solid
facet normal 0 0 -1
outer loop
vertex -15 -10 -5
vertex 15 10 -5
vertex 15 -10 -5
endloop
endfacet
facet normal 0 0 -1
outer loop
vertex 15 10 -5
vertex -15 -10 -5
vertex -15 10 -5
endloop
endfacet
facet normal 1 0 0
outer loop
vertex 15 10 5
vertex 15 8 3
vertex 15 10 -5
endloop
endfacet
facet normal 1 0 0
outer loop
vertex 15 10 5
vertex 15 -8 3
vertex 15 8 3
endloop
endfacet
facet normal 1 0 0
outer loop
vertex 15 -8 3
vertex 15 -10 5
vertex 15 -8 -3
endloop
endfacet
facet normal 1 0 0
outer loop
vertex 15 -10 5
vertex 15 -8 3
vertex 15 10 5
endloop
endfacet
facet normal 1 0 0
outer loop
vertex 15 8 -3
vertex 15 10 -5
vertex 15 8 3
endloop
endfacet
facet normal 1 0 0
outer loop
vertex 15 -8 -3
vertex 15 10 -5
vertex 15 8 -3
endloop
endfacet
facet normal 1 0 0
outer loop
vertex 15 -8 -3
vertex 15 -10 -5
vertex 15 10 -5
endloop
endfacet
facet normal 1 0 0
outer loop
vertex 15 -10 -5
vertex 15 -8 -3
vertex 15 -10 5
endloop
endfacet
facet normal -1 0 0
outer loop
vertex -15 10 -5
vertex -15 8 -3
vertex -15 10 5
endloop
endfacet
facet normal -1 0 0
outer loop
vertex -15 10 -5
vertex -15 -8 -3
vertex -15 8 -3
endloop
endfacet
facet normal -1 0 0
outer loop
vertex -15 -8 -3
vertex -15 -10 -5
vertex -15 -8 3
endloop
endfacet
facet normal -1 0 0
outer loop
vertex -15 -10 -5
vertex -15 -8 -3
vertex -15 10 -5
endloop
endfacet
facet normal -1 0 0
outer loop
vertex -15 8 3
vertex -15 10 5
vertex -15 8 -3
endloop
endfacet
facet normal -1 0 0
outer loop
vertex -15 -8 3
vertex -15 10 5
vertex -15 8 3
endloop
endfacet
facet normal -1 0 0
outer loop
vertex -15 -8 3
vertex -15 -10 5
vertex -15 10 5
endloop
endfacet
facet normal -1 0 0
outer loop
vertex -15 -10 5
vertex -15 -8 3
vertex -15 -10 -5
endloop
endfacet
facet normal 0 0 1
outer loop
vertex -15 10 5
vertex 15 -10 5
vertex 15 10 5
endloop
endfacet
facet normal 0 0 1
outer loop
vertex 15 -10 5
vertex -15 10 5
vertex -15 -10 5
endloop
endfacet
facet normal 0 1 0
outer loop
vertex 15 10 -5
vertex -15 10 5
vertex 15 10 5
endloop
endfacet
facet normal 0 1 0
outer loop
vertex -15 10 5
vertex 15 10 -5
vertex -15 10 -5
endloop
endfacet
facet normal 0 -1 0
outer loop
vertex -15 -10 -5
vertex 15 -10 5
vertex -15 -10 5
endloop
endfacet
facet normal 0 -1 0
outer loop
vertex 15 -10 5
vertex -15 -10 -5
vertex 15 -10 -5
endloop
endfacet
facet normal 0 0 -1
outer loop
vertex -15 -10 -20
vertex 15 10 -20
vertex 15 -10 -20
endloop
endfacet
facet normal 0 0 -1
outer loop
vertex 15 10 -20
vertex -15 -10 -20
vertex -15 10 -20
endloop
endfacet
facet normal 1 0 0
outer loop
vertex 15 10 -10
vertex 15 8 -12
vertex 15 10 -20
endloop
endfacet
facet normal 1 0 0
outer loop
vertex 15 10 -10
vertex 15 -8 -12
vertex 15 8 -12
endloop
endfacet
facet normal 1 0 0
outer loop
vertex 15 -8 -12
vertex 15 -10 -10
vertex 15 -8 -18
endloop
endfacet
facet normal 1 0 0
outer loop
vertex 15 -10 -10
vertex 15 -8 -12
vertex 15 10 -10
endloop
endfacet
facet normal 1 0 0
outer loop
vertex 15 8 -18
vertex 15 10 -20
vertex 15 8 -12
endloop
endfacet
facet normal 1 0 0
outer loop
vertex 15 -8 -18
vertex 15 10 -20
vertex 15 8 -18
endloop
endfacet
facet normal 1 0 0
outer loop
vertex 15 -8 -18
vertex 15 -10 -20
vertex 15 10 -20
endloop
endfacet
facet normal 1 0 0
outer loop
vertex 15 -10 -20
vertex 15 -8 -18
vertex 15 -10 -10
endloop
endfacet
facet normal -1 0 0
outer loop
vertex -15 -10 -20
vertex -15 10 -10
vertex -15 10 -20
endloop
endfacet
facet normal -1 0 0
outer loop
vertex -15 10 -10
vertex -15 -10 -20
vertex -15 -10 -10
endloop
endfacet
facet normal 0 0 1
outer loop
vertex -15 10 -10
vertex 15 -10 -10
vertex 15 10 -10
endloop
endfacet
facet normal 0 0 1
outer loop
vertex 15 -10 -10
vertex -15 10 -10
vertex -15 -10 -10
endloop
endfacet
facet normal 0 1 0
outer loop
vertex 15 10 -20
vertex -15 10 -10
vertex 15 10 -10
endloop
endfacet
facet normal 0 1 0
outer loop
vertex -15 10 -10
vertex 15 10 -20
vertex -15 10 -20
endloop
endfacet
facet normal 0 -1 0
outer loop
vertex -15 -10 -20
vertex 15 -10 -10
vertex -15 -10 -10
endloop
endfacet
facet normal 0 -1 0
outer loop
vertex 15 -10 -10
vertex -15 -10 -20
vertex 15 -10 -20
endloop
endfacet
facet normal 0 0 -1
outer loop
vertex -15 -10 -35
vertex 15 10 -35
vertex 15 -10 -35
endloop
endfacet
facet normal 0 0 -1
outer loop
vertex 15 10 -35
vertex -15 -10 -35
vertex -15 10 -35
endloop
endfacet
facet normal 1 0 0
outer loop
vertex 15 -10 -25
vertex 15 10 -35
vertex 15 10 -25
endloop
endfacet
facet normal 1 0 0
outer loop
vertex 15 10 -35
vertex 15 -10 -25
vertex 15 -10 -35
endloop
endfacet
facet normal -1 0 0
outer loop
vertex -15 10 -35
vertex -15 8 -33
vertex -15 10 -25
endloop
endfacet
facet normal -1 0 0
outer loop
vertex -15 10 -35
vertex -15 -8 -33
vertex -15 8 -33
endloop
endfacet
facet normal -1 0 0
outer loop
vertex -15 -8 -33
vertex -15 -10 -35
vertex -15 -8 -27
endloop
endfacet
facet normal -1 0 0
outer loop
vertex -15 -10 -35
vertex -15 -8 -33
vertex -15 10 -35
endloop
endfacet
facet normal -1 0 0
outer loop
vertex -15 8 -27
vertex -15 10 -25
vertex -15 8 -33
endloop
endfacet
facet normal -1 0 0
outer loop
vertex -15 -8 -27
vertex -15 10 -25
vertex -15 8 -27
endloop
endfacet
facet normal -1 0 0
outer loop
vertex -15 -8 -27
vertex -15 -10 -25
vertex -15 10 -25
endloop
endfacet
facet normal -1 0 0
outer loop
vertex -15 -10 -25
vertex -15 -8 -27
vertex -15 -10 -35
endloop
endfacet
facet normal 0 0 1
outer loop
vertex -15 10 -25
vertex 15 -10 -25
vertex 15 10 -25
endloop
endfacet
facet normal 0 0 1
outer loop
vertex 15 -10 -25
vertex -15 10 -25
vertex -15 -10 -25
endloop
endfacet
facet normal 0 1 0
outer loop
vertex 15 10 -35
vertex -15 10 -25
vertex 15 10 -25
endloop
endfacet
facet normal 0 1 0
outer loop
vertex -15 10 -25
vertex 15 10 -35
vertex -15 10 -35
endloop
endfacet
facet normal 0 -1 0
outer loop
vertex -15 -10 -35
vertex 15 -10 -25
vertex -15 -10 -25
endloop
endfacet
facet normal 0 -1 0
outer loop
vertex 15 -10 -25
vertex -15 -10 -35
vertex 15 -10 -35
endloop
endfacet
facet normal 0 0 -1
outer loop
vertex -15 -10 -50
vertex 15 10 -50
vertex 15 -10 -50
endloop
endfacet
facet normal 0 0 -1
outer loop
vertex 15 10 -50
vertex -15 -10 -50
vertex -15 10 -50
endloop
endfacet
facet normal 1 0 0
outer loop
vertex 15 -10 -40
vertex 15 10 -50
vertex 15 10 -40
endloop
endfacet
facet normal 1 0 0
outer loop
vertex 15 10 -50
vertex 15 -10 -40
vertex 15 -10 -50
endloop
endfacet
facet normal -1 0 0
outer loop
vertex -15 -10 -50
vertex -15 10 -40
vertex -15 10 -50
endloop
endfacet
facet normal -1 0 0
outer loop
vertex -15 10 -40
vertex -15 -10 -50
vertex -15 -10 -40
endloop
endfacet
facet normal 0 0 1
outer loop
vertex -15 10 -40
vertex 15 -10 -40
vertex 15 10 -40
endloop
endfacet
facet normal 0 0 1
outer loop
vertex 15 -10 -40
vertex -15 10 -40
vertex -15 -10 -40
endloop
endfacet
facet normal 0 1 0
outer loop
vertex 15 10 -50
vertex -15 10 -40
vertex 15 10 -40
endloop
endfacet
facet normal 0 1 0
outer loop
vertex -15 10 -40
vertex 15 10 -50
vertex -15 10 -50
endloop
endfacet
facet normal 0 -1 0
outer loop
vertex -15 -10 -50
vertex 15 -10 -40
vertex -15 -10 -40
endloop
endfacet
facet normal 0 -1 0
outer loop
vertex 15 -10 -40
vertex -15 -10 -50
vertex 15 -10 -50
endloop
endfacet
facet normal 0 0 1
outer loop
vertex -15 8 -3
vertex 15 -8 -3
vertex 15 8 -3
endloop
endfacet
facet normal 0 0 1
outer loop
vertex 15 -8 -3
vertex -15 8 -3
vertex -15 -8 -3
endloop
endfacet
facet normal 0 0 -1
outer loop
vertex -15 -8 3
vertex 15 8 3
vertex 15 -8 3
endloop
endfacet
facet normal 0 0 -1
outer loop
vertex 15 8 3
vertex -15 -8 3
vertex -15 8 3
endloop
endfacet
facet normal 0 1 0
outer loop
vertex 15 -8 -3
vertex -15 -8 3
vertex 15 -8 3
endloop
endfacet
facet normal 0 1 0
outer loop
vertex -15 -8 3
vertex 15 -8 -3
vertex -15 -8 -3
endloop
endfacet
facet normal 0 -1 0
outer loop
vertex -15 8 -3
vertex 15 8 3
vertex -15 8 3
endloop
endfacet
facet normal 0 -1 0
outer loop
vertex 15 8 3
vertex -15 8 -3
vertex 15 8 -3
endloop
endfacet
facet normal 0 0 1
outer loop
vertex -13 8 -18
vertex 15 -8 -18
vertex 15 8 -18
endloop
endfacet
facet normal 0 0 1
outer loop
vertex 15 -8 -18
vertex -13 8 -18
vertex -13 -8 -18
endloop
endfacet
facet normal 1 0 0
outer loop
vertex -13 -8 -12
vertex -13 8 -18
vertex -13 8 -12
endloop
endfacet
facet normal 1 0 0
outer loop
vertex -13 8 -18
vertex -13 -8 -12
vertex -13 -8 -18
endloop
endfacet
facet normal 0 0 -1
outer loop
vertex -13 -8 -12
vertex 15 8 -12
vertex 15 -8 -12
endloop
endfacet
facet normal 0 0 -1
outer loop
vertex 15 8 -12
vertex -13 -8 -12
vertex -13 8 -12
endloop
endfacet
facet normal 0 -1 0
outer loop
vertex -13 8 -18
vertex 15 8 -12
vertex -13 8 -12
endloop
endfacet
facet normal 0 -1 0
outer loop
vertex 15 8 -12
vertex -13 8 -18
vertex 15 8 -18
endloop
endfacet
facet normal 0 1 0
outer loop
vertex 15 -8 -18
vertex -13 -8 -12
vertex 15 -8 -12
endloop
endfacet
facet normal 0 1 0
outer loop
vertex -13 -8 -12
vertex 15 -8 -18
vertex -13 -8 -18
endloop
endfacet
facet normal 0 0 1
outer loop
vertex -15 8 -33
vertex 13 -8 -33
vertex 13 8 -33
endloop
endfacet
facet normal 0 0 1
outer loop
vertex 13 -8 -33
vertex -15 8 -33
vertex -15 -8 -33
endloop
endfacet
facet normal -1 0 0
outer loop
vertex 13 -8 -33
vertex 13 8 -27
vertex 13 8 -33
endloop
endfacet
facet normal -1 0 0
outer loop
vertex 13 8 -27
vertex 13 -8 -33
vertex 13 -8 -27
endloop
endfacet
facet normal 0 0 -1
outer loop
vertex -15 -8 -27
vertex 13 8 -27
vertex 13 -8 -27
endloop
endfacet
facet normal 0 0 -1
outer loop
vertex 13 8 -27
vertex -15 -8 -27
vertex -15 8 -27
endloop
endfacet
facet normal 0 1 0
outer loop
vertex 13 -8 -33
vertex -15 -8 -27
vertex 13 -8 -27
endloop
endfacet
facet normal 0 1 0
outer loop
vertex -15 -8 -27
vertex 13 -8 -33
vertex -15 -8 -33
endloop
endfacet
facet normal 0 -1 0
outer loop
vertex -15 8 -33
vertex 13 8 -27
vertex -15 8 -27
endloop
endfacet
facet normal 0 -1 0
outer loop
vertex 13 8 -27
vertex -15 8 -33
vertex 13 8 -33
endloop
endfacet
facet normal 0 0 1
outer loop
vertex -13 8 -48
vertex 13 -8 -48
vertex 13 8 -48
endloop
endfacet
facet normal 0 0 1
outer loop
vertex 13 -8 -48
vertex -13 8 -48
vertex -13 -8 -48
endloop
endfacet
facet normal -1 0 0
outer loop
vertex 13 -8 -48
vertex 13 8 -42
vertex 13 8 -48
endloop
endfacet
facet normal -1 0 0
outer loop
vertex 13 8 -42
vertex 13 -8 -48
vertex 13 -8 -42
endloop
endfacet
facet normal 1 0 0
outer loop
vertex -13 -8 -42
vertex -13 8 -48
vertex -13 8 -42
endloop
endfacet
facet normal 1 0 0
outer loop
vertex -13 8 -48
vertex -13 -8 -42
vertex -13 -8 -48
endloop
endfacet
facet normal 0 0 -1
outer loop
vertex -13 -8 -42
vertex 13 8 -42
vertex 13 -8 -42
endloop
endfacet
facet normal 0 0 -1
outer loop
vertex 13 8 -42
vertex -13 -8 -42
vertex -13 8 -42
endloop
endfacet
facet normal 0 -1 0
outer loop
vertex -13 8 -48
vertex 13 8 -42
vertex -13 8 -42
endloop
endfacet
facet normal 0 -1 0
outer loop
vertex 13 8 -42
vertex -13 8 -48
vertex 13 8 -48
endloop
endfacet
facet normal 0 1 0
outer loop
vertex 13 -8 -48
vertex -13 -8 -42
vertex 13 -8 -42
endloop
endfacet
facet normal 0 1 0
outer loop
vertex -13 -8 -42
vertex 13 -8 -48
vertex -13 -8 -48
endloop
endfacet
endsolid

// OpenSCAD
//=================================================
WALL_THICK = 4;

//            D   H   TRANS         ROTATE   endcap endcap               
cylinder1 = [ 55, 66, [0,0,0],      [0,0,0],   0, 1 ]; // dia, len, translate[x,y,z]
cylinder2 = [ 20, 30, [100,0,10/2], [0,0,0],   1, 0 ]; // dia, len, translate[x,y,z]
cylinder3 = [ 55, 66, [-30,0,0],    [0,0,0],   0, 1 ]; // dia, len, translate[x,y,z]
cylinder4 = [ 20, 30, [-100,0,10/2],[0,-90,0], 0, 1 ]; // dia, len, translate[x,y,z]

cylinder5 = [ 55, 66, [ 0,30,0],     [0,0,0],   1, 0 ]; // dia, len, translate[x,y,z]
cylinder6 = [ 20, 30, [ 0,100, 10/2],[0,-90,0], 1, 0 ]; // dia, len, translate[x,y,z]
cylinder7 = [ 55, 66, [ 0,-30,0],    [0,0,0],   0, 1 ]; // dia, len, translate[x,y,z]
cylinder8 = [ 20, 30, [ 0,-100,10/2],[0,-90,0], 0, 1 ]; // dia, len, translate[x,y,z]

//             0              1              2       3    4
box1 = [ [ 10, 20, 30] , [  0, 0, 0 ], [ 0,  0, 0 ], 0, 0];
box2 = [ [ 10, 20, 30] , [ 15, 0, 0 ], [ 0,  0, 0 ], 1, 0];
box3 = [ [ 10, 20, 30] , [ 30, 0, 0 ], [ 0,  0, 0 ], 0, 1];
box4 = [ [ 10, 20, 30] , [ 45, 0, 0 ], [ 0,  0, 0 ], 1, 1];

CYLINDER_LIST = [cylinder1, cylinder2]; //, cylinder3, cylinder4, cylinder5, cylinder6, cylinder7, cylinder8 ]; 
BOX_LIST=[box1, box2, box3, box4]; //, box2];

module make_cubes(action, stuff)
{
    if (action == "BOM")
    {
        // for each work object, execute the cmd on the object
        // the command is specified on the line after this BOM caller
        for(i=[0:1:$children-1])
           children(i); // do the shapes that come after us!
    }
    
    else if (action == "ADD")
    {
        num_items =  len(BOX_LIST)-1;
        for ( item = [ 0: num_items ])
        {
            echo ("item = ", item);
            echo ("dims = ", BOX_LIST[item][0]);

            rotate( [ 0, 90, 0 ])           // axis start on x axis

            rotate( BOX_LIST[item][2]) // user override
            translate( BOX_LIST[item][1])
            
            if ($preview)
                %cube( BOX_LIST[item][0], center=true);
            else
                cube( BOX_LIST[item][0], center=true);
        }
        echo ("----- end adding ------");
    }
    else if (action == "REMOVE")
    {
        num_items =  len(BOX_LIST)-1;
        for ( item = [ 0: num_items ])
        {
           echo ("rmv -------- #", item);
           
            newW = (BOX_LIST[item][3] + BOX_LIST[item][4]) * WALL_THICK;

            echo ("item = ", item);
            echo ("x = ", BOX_LIST[item].x);
            echo ("endcapL = ",BOX_LIST[item][3]);
            echo ("endcapR = ",BOX_LIST[item][4]);
            echo ("newW = ", newW);
           
            // div 2, we are working with centered items.
            bump = ((BOX_LIST[item][3] - BOX_LIST[item][4]) * WALL_THICK)/2;
            echo ("bump = ", bump);

            if ($preview)
            {
                // apply encap walls 
                translate ([ bump/2, 0, 0]) // remember were on center /2 
                // start cylinder on x-axis
                rotate( [ 0, 90, 0 ])      

                // now do user stuff
                rotate( BOX_LIST[item][2]) // user override
                translate( BOX_LIST[item][1])
                
                #cube( [BOX_LIST[item][0].x - WALL_THICK, 
                       BOX_LIST[item][0].y - WALL_THICK,
                       BOX_LIST[item][0].z - newW/2],
                       center=true);
            }
            else
            {
                // apply encap walls 
                translate ([ bump/2, 0, 0]) // remember were on center /2 
                // start cylinder on x-axis
                rotate( [ 0, 90, 0 ])      

                // now do user stuff
                rotate( BOX_LIST[item][2]) // user override
                translate( BOX_LIST[item][1])
                
                cube( [BOX_LIST[item][0].x - WALL_THICK, 
                       BOX_LIST[item][0].y - WALL_THICK,
                       BOX_LIST[item][0].z - newW/2],
                       center=true);
            }
        }
    }
    else
        assert(0);   
}
//---------------------------------------------------------------------------    
module make_cylinders(action, stuff)
{
    if (action == "BOM")
    {
        // for each work object, execute the cmd on the object
        // the command is specified on the line after this BOM caller
        for(i=[0:1:$children-1])
           children(i); // do the shapes that come after us!
    }
    
    else if (action == "ADD")
    {
        num_items =  len(CYLINDER_LIST)-1;
        for ( item = [ 0: num_items ])
        {
            height =  CYLINDER_LIST[item][1];
            echo ("item = ", item);
            echo ("dia = ", CYLINDER_LIST[item][0], "height = ", CYLINDER_LIST[item][1]);

            rotate( [ 0, 90, 0 ])           // axis start on x axis

            rotate( CYLINDER_LIST[item][3]) // user override
            translate( CYLINDER_LIST[item][2])
            
            #cylinder( d= CYLINDER_LIST[item][0], h = height, center=true);
            
        }
        echo ("----- end adding ------");
    }
    else if (action == "REMOVE")
    {
        num_items =  len(CYLINDER_LIST)-1;
        for ( item = [ 0: num_items ])
        {
           echo ("rmv -------- #", item);
           
           height =   CYLINDER_LIST[item][1] 
                     - (CYLINDER_LIST[item][4] + CYLINDER_LIST[item][5]) * WALL_THICK;
            echo ("item = ", item);
            echo ("dia = ", CYLINDER_LIST[item][0], "height = ", CYLINDER_LIST[item][1]);
            echo ("endcapL = ",CYLINDER_LIST[item][4]);
            echo ("endcapR = ",CYLINDER_LIST[item][5]);
            echo ("newH = ", height);
           
            bump = (CYLINDER_LIST[item][4] - CYLINDER_LIST[item][5]) * WALL_THICK;
            echo ("bump = ", bump);

            if ($preview)
            {
                // apply encap walls 
                translate ([ bump/2, 0, 0]) // remember were on center /2 
                // start cylinder on x-axis
                rotate( [ 0, 90, 0 ])      

                // now do user stuff
                rotate( CYLINDER_LIST[item][3]) // user override
                translate( CYLINDER_LIST[item][2])
                
                %cylinder( d= CYLINDER_LIST[item][0] - WALL_THICK * 2, h = height, center=true);
            }
            else
            {
                // apply encap walls 
                translate ([ bump/2, 0, 0]) // remember were on center /2 
                // start cylinder on x-axis
                rotate( [ 0, 90, 0 ])      

                // now do user stuff
                rotate( CYLINDER_LIST[item][3]) // user override
                translate( CYLINDER_LIST[item][2])
                
                #cylinder( d= CYLINDER_LIST[item][0] - WALL_THICK * 2, h = height, center=true);
            }
        }
    }
    else
        assert(0);   
}
//77777777777777777777777777


//------------------------------------------------------------

if (1)
{
    difference()
    {
      make_cubes("BOM", stuff=BOX_LIST)
        make_cubes("ADD", stuff=BOX_LIST);

      union()
      {
          make_cubes("BOM", stuff=BOX_LIST)
            make_cubes("REMOVE", stuff=BOX_LIST);
      }
    } 
}
else
{
    difference()
    {
      make_cylinders("BOM", stuff=CYLINDER_LIST)
        make_cylinders("ADD", stuff=CYLINDER_LIST);

      union()
      {
          make_cylinders("BOM", stuff=CYLINDER_LIST)
            make_cylinders("REMOVE", stuff=CYLINDER_LIST);
      }
    } 
}
